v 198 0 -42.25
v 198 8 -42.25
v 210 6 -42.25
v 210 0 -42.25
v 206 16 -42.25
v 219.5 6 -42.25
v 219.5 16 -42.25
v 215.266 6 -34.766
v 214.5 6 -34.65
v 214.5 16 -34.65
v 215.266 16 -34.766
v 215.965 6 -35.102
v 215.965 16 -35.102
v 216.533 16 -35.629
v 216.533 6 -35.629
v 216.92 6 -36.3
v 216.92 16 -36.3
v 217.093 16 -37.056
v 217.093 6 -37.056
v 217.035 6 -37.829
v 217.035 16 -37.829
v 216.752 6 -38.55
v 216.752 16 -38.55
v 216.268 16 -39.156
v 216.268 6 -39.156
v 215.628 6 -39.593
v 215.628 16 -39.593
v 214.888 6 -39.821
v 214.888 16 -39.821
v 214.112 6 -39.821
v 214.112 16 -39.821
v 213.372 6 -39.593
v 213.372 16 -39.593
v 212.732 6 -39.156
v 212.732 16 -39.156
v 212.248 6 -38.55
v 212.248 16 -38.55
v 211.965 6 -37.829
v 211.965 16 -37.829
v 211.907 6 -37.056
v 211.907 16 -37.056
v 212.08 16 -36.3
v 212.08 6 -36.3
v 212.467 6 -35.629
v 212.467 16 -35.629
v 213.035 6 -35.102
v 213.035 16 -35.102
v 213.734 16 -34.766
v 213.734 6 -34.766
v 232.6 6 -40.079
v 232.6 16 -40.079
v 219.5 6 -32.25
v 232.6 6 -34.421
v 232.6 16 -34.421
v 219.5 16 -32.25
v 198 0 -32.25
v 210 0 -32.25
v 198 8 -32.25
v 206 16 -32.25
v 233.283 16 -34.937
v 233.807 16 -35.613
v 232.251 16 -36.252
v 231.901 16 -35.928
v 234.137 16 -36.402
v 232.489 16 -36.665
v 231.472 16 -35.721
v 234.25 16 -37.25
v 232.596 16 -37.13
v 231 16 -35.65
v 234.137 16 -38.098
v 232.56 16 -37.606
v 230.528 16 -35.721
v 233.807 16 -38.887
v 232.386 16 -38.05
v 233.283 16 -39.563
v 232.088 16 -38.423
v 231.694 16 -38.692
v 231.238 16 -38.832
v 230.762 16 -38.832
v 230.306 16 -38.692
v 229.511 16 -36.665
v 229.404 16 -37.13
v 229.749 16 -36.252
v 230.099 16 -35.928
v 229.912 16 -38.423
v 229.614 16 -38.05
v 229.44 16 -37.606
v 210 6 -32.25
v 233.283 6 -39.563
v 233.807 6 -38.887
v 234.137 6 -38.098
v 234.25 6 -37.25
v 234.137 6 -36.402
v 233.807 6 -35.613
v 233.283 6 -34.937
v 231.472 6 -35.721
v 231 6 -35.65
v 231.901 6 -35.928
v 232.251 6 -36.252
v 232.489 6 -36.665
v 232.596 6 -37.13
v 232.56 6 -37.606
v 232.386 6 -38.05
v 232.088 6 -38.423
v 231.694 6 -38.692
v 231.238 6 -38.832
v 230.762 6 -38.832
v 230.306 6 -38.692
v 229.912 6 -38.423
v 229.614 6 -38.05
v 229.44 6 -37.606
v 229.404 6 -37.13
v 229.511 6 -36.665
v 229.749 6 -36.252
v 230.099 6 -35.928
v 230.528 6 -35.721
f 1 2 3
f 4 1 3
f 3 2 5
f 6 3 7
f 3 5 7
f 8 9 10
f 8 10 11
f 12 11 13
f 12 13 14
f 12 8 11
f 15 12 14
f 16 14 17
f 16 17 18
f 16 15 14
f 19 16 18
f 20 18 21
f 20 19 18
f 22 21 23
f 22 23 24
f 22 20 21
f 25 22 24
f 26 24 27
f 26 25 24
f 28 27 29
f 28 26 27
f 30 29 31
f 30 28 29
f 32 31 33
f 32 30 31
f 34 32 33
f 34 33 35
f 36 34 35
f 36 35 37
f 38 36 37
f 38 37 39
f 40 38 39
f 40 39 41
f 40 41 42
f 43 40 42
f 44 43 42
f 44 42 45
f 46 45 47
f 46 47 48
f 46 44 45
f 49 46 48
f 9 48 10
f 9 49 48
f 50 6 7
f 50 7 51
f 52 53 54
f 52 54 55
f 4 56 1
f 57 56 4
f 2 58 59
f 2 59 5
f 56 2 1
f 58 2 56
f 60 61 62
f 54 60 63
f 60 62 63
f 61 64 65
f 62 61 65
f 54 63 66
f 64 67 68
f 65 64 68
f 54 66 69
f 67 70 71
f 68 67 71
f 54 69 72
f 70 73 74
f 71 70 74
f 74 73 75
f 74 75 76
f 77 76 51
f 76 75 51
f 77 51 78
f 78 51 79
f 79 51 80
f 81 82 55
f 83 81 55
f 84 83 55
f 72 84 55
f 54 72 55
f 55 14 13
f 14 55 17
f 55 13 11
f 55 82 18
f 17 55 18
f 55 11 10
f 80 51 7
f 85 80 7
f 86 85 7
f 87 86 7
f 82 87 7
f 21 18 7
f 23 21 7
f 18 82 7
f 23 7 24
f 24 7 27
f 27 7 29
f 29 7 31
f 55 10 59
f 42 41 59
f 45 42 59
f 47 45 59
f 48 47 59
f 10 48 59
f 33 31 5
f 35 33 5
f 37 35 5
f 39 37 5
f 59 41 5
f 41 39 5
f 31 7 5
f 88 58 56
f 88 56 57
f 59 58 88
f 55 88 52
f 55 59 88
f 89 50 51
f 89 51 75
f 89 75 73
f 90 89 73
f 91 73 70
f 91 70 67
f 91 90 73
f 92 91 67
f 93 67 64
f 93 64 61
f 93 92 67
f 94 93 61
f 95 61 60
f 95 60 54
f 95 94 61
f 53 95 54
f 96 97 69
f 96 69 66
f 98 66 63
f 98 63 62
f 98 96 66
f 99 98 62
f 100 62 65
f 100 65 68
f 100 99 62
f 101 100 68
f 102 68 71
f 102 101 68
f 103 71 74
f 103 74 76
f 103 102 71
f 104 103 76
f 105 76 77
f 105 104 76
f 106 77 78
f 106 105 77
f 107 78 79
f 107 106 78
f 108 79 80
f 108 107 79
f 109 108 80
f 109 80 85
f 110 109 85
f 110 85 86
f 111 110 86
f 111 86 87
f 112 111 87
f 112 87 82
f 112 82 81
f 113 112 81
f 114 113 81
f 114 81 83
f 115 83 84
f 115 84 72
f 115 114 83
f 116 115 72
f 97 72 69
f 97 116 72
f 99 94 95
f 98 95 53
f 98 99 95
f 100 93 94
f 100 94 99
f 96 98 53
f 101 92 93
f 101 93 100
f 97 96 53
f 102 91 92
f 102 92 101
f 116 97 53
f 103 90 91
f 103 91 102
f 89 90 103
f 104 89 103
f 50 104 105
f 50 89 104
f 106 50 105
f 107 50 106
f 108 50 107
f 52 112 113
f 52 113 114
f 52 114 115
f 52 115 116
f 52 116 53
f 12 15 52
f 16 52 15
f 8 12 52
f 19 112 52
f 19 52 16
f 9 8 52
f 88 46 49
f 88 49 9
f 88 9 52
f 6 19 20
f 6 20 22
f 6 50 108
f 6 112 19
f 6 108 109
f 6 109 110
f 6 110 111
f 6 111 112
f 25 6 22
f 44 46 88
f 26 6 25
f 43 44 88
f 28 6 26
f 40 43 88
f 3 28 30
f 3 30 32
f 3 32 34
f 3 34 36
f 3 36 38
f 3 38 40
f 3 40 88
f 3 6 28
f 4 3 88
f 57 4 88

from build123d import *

# Parameters (mm, degrees)
SKETCH1_R             = 5.9875
SKETCH1_R_2           = 1.7
SKETCH1_R_3           = 1.6
BOSS_EXTRUDE1_DEPTH   = 6
MOVE_FACE1_BY         = 5
MOVE_FACE1_2_BY       = 5
MOVE_FACE1_3_BY       = 5
MOVE_FACE1_4_BY       = 5
M4X0_7_TAPPED_HOLE2_D = 3.3
POCKET_WALLS_DEPTH    = 2.6
RIB_PATTERN_DEPTH     = 3
MOVE_FACE2_BY         = 4.5
MOVE_FACE2_2_BY       = 4.5
MOVE_FACE2_3_BY       = 4.5
MOVE_FACE2_4_BY       = 4.5
MOVE_FACE2_5_BY       = 4.5
MOVE_FACE2_6_BY       = 4.5
MOVE_FACE2_7_BY       = 4.5
MOVE_FACE2_8_BY       = 4.5
MOVE_FACE2_9_BY       = 4.5
MOVE_FACE2_10_BY      = 4.5
MOVE_FACE2_11_BY      = 4.5
MOVE_FACE2_12_BY      = 4.5
MOVE_FACE2_13_BY      = 4.5
MOVE_FACE2_14_BY      = 4.5
BOSS_EXTRUDE6_REACH   = 382.427
SKETCH19_W            = 1
SKETCH19_H            = 3
BOSS_EXTRUDE7_REACH   = 375.768
SKETCH20_W            = 1
SKETCH20_H            = 3
CUT_EXTRUDE4_DEPTH    = 4.5
POCKET_FILLETS_R      = 2.5
FILLET9_R             = 3
MOVE_FACE3_BY         = 12
MOVE_FACE3_2_BY       = 12
SKETCH23_W            = 12
SKETCH23_H            = 38.175
CUT_EXTRUDE5_DEPTH    = 245.489391385
MOVE_FACE4_BY         = 4
MOVE_FACE4_2_BY       = 4
FILLET6_R             = 5
FILLET7_R             = 11
FILLET8_START         = -1
FILLET8_DEPTH         = 8
FILLET8_2_DEPTH       = 6
SKETCH25_R            = 1.6
SKETCH25_R_2          = 2.6
BOSS_EXTRUDE9_DEPTH   = 10
SKETCH26_W            = 12
SKETCH26_H            = 10
BOSS_EXTRUDE10_DEPTH  = 6
CHAMFER2_SIZE         = 8


with BuildPart() as part:
    # Sketch1 → Boss-Extrude1 (new body)
    with BuildSketch(Plane(origin=(0, 0, 0), x_dir=(1, 0, 0), z_dir=(0, 1, 0))):
        Polygon((-240, 46.25), (-198, 46.25), (-198, 26.5), (198, 26.5), (198, 46.25), (240, 46.25), (240, -18.75), (201, -18.75), (201, 0), (-201, 0), (-201, -18.75), (-240, -18.75), align=None)
        with Locations(Location((-231, 24.425, 0), (0, 0, 270))):
            Circle(SKETCH1_R, mode=Mode.SUBTRACT)
        with Locations(Location((-214.5, 37.25, 0), (0, 0, 270))):
            Circle(SKETCH1_R, mode=Mode.SUBTRACT)
        with Locations(Location((214.5, 37.25, 0), (0, 0, 90))):
            Circle(SKETCH1_R, mode=Mode.SUBTRACT)
        with Locations(Location((231, 24.425, 0), (0, 0, 90))):
            Circle(SKETCH1_R, mode=Mode.SUBTRACT)
        with Locations(Location((-204.5, -6.05, 0), (0, 0, 270))):
            Circle(SKETCH1_R_2, mode=Mode.SUBTRACT)
        with Locations(Location((-224.5, -6.05, 0), (0, 0, 270))):
            Circle(SKETCH1_R_2, mode=Mode.SUBTRACT)
        with Locations(Location((-204.5, 13.95, 0), (0, 0, 270))):
            Circle(SKETCH1_R_2, mode=Mode.SUBTRACT)
        with Locations(Location((-224.5, 13.95, 0), (0, 0, 270))):
            Circle(SKETCH1_R_2, mode=Mode.SUBTRACT)
        with Locations(Location((204.5, -6.05, 0), (0, 0, 90))):
            Circle(SKETCH1_R_2, mode=Mode.SUBTRACT)
        with Locations(Location((204.5, 13.95, 0), (0, 0, 90))):
            Circle(SKETCH1_R_2, mode=Mode.SUBTRACT)
        with Locations(Location((224.5, 13.95, 0), (0, 0, 90))):
            Circle(SKETCH1_R_2, mode=Mode.SUBTRACT)
        with Locations(Location((224.5, -6.05, 0), (0, 0, 90))):
            Circle(SKETCH1_R_2, mode=Mode.SUBTRACT)
        with Locations(Location((-187.5, 13.25, 0), (0, 0, 270))):
            Circle(SKETCH1_R_3, mode=Mode.SUBTRACT)
        with Locations(Location((-162.5, 13.25, 0), (0, 0, 270))):
            Circle(SKETCH1_R_3, mode=Mode.SUBTRACT)
        with Locations(Location((-137.5, 13.25, 0), (0, 0, 270))):
            Circle(SKETCH1_R_3, mode=Mode.SUBTRACT)
        with Locations(Location((-112.5, 13.25, 0), (0, 0, 270))):
            Circle(SKETCH1_R_3, mode=Mode.SUBTRACT)
        with Locations(Location((-87.5, 13.25, 0), (0, 0, 270))):
            Circle(SKETCH1_R_3, mode=Mode.SUBTRACT)
        with Locations(Location((-62.5, 13.25, 0), (0, 0, 270))):
            Circle(SKETCH1_R_3, mode=Mode.SUBTRACT)
        with Locations(Location((-37.5, 13.25, 0), (0, 0, 270))):
            Circle(SKETCH1_R_3, mode=Mode.SUBTRACT)
        with Locations(Location((-12.5, 13.25, 0), (0, 0, 270))):
            Circle(SKETCH1_R_3, mode=Mode.SUBTRACT)
        with Locations(Location((12.5, 13.25, 0), (0, 0, 270))):
            Circle(SKETCH1_R_3, mode=Mode.SUBTRACT)
        with Locations(Location((37.5, 13.25, 0), (0, 0, 270))):
            Circle(SKETCH1_R_3, mode=Mode.SUBTRACT)
        with Locations(Location((62.5, 13.25, 0), (0, 0, 270))):
            Circle(SKETCH1_R_3, mode=Mode.SUBTRACT)
        with Locations(Location((87.5, 13.25, 0), (0, 0, 270))):
            Circle(SKETCH1_R_3, mode=Mode.SUBTRACT)
        with Locations(Location((112.5, 13.25, 0), (0, 0, 270))):
            Circle(SKETCH1_R_3, mode=Mode.SUBTRACT)
        with Locations(Location((137.5, 13.25, 0), (0, 0, 270))):
            Circle(SKETCH1_R_3, mode=Mode.SUBTRACT)
        with Locations(Location((-231, 37.25, 0), (0, 0, 270))):
            Circle(SKETCH1_R_3, mode=Mode.SUBTRACT)
        with Locations(Location((231, 37.25, 0), (0, 0, 90))):
            Circle(SKETCH1_R_3, mode=Mode.SUBTRACT)
        with Locations(Location((162.5, 13.25, 0), (0, 0, 270))):
            Circle(SKETCH1_R_3, mode=Mode.SUBTRACT)
        with Locations(Location((187.5, 13.25, 0), (0, 0, 270))):
            Circle(SKETCH1_R_3, mode=Mode.SUBTRACT)
    extrude(amount=BOSS_EXTRUDE1_DEPTH)

    # Move Face1: a curved face moved outward by 5.0
    add(Solid.thicken(part.faces().sort_by_distance((231, 3, -18.4375))[0], MOVE_FACE1_BY))

    # Move Face1 2: a curved face moved outward by 5.0
    add(Solid.thicken(part.faces().sort_by_distance((214.5, 3, -31.2625))[0], MOVE_FACE1_2_BY))

    # Move Face1 3: a curved face moved outward by 5.0
    add(Solid.thicken(part.faces().sort_by_distance((-214.5, 3, -43.2375))[0], MOVE_FACE1_3_BY))

    # Move Face1 4: a curved face moved outward by 5.0
    add(Solid.thicken(part.faces().sort_by_distance((-231, 3, -30.4125))[0], MOVE_FACE1_4_BY))

    # M4x0.7 Tapped Hole2 (through all)
    with Locations(Plane(origin=(0, 6, 0), x_dir=(1, 0, 0), z_dir=(0, 1, 0))):
        with Locations((-214.5, 37.25), (-231, 24.425), (231, 24.425), (214.5, 37.25)):
            Hole(M4X0_7_TAPPED_HOLE2_D / 2)

    # Sketch13 → Pocket Walls (add)
    with BuildSketch(Plane.XY):
        Polygon((-214, 6), (-208.803847577, 9), (208.803847577, 9), (214, 6), align=None)
    pocket_walls = extrude(amount=-POCKET_WALLS_DEPTH)

    # Mirror1: Pocket Walls across plane
    add(pocket_walls.mirror(Plane.XY.offset(-13.25)))

    # zig_zag_style_1 → Rib Pattern (add)
    with BuildSketch(Plane(origin=(0, 6, 0), x_dir=(1, 0, 0), z_dir=(0, 1, 0))):
        Polygon((-186.851468198, 1.838812439), (-162.5, 22.586263345), (-137.5, 1.286263345), (-112.5, 22.586263345), (-87.5, 1.286263345), (-62.5, 22.586263345), (-37.5, 1.286263345), (-12.5, 22.586263345), (12.5, 1.286263345), (37.5, 22.586263345), (62.5, 1.286263345), (87.5, 22.586263345), (112.5, 1.286263345), (137.5, 22.586263345), (162.5, 1.286263345), (188.148531802, 23.138812439), (186.851468198, 24.661187561), (162.5, 3.913736655), (137.5, 25.213736655), (112.5, 3.913736655), (87.5, 25.213736655), (62.5, 3.913736655), (37.5, 25.213736655), (12.5, 3.913736655), (-12.5, 25.213736655), (-37.5, 3.913736655), (-62.5, 25.213736655), (-87.5, 3.913736655), (-112.5, 25.213736655), (-137.5, 3.913736655), (-162.5, 25.213736655), (-188.148531802, 3.361187561), align=None)
    extrude(amount=RIB_PATTERN_DEPTH)

    # Move Face2: a face moved inward by 4.5
    extrude(part.faces().sort_by_distance((162.5, 6, -17.307514961))[0], amount=MOVE_FACE2_BY, dir=(0, -1, 0), mode=Mode.SUBTRACT)

    # Move Face2 2: a face moved inward by 4.5
    extrude(part.faces().sort_by_distance((137.5, 6, -9.192485039))[0], amount=MOVE_FACE2_2_BY, dir=(0, -1, 0), mode=Mode.SUBTRACT)

    # Move Face2 3: a face moved inward by 4.5
    extrude(part.faces().sort_by_distance((112.5, 6, -17.307514961))[0], amount=MOVE_FACE2_3_BY, dir=(0, -1, 0), mode=Mode.SUBTRACT)

    # Move Face2 4: a face moved inward by 4.5
    extrude(part.faces().sort_by_distance((87.5, 6, -9.192485039))[0], amount=MOVE_FACE2_4_BY, dir=(0, -1, 0), mode=Mode.SUBTRACT)

    # Move Face2 5: a face moved inward by 4.5
    extrude(part.faces().sort_by_distance((62.5, 6, -17.307514961))[0], amount=MOVE_FACE2_5_BY, dir=(0, -1, 0), mode=Mode.SUBTRACT)

    # Move Face2 6: a face moved inward by 4.5
    extrude(part.faces().sort_by_distance((37.5, 6, -9.192485039))[0], amount=MOVE_FACE2_6_BY, dir=(0, -1, 0), mode=Mode.SUBTRACT)

    # Move Face2 7: a face moved inward by 4.5
    extrude(part.faces().sort_by_distance((12.5, 6, -17.307514961))[0], amount=MOVE_FACE2_7_BY, dir=(0, -1, 0), mode=Mode.SUBTRACT)

    # Move Face2 8: a face moved inward by 4.5
    extrude(part.faces().sort_by_distance((-12.5, 6, -9.192485039))[0], amount=MOVE_FACE2_8_BY, dir=(0, -1, 0), mode=Mode.SUBTRACT)

    # Move Face2 9: a face moved inward by 4.5
    extrude(part.faces().sort_by_distance((-37.5, 6, -17.307514961))[0], amount=MOVE_FACE2_9_BY, dir=(0, -1, 0), mode=Mode.SUBTRACT)

    # Move Face2 10: a face moved inward by 4.5
    extrude(part.faces().sort_by_distance((-62.5, 6, -9.192485039))[0], amount=MOVE_FACE2_10_BY, dir=(0, -1, 0), mode=Mode.SUBTRACT)

    # Move Face2 11: a face moved inward by 4.5
    extrude(part.faces().sort_by_distance((-87.5, 6, -17.307514961))[0], amount=MOVE_FACE2_11_BY, dir=(0, -1, 0), mode=Mode.SUBTRACT)

    # Move Face2 12: a face moved inward by 4.5
    extrude(part.faces().sort_by_distance((-112.5, 6, -9.192485039))[0], amount=MOVE_FACE2_12_BY, dir=(0, -1, 0), mode=Mode.SUBTRACT)

    # Move Face2 13: a face moved inward by 4.5
    extrude(part.faces().sort_by_distance((-162.5, 6, -9.192485039))[0], amount=MOVE_FACE2_13_BY, dir=(0, -1, 0), mode=Mode.SUBTRACT)

    # Move Face2 14: a face moved inward by 4.5
    extrude(part.faces().sort_by_distance((-137.5, 6, -17.307514961))[0], amount=MOVE_FACE2_14_BY, dir=(0, -1, 0), mode=Mode.SUBTRACT)

    # Boss-Extrude6: up to this face of the body (flat: up to its plane)
    boss_extrude6_end = Plane(part.part.faces().sort_by_distance((199.498029235, 7.445651316, -23.9))[0])
    # Sketch19 → Boss-Extrude6 (add, up to the picked face)
    with BuildSketch(Plane(origin=(120.437057913, 0, -102.612373342), x_dir=(-0.6485318015860708, 0, -0.7611875605470214), z_dir=(0.7611875605470213, 0, -0.6485318015860707)), mode=Mode.PRIVATE) as boss_extrude6_sk1:
        with Locations((-103.9073301, 7.5)):
            Rectangle(SKETCH19_W, SKETCH19_H)
    boss_extrude6_tool1 = split(extrude(boss_extrude6_sk1.sketch, amount=BOSS_EXTRUDE6_REACH, mode=Mode.PRIVATE), bisect_by=boss_extrude6_end, keep=Keep.BOTH, mode=Mode.PRIVATE)
    add(boss_extrude6_tool1.solids().sort_by(Axis((187.824266, 7.5, -23.519406), (0.7611875605470213, 0, -0.6485318015860707)))[0])

    # Boss-Extrude7: up to this face of the body (flat: up to its plane)
    boss_extrude7_end = Plane(part.part.faces().sort_by_distance((-199.498029235, 7.445651316, -2.6))[0])
    # Sketch20 → Boss-Extrude7 (add, up to the picked face)
    with BuildSketch(Plane(origin=(-107.355217903, 0, 91.466645654), x_dir=(0.6485318015860708, 0, 0.7611875605470213), z_dir=(-0.7611875605470213, 0, 0.6485318015860708)), mode=Mode.PRIVATE) as boss_extrude7_sk1:
        with Locations((-124.078800455, 7.5)):
            Rectangle(SKETCH20_W, SKETCH20_H)
    boss_extrude7_tool1 = split(extrude(boss_extrude7_sk1.sketch, amount=BOSS_EXTRUDE7_REACH, mode=Mode.PRIVATE), bisect_by=boss_extrude7_end, keep=Keep.BOTH, mode=Mode.PRIVATE)
    add(boss_extrude7_tool1.solids().sort_by(Axis((-187.824266, 7.5, -2.980594), (-0.7611875605470213, 0, 0.6485318015860708)))[0])

    # Sketch22 → Cut-Extrude4 (cut)
    with BuildSketch(Plane(origin=(0, 6, 0), x_dir=(1, 0, 0), z_dir=(0, 1, 0))):
        Polygon((-201, 2.6), (-201, 23.9), (-164.041944431, 23.9), (-189.041944431, 2.6), align=None)
        Polygon((201, 2.6), (201, 23.9), (189.041944431, 23.9), (164.041944431, 2.6), align=None)
    extrude(amount=-CUT_EXTRUDE4_DEPTH, mode=Mode.SUBTRACT)

    # Pocket FIllets
    pocket_fillets_edges = [part.edges().sort_by_distance(p)[0] for p in [
        (185.958055569, 5.25, -23.9),
        (139.041944431, 5.25, -23.9),
        (135.958055569, 5.25, -23.9),
        (89.041944431, 5.25, -23.9),
        (85.958055569, 5.25, -23.9),
        (39.041944431, 5.25, -23.9),
        (35.958055569, 5.25, -23.9),
        (-10.958055569, 5.25, -23.9),
        (-14.041944431, 5.25, -23.9),
        (-60.958055569, 5.25, -23.9),
        (-64.041944431, 5.25, -23.9),
        (-110.958055569, 5.25, -23.9),
        (-114.041944431, 5.25, -23.9),
        (-160.958055569, 5.25, -23.9),
        (-164.041944431, 5.25, -23.9),
        (164.041944431, 5.25, -2.6),
        (-185.958055569, 5.25, -2.6),
        (-139.041944431, 5.25, -2.6),
        (-135.958055569, 5.25, -2.6),
        (-89.041944431, 5.25, -2.6),
        (-85.958055569, 5.25, -2.6),
        (-39.041944431, 5.25, -2.6),
        (-35.958055569, 5.25, -2.6),
        (10.958055569, 5.25, -2.6),
        (14.041944431, 5.25, -2.6),
        (60.958055569, 5.25, -2.6),
        (64.041944431, 5.25, -2.6),
        (110.958055569, 5.25, -2.6),
        (114.041944431, 5.25, -2.6),
        (160.958055569, 5.25, -2.6),
        (137.5, 5.25, -22.586263345),
        (87.5, 5.25, -22.586263345),
        (37.5, 5.25, -22.586263345),
        (-12.5, 5.25, -22.586263345),
        (-62.5, 5.25, -22.586263345),
        (-112.5, 5.25, -22.586263345),
        (-162.5, 5.25, -22.586263345),
        (-137.5, 5.25, -3.913736655),
        (-87.5, 5.25, -3.913736655),
        (-37.5, 5.25, -3.913736655),
        (12.5, 5.25, -3.913736655),
        (62.5, 5.25, -3.913736655),
        (112.5, 5.25, -3.913736655),
        (162.5, 5.25, -3.913736655),
        (189.041944431, 5.25, -23.9),
        (-189.041944431, 5.25, -2.6),
    ]]
    fillet(pocket_fillets_edges, radius=POCKET_FILLETS_R)

    # Fillet9
    fillet9_edges = [part.edges().sort_by_distance(p)[0] for p in [
        (-201, 3.75, -2.6),
        (-201, 3.75, -23.9),
        (201, 3.75, -2.6),
        (201, 3.75, -23.9),
    ]]
    fillet(fillet9_edges, radius=FILLET9_R)

    # Move Face3: a face moved inward by 12.0
    extrude(part.faces().sort_by_distance((198, 3, -36.375))[0], amount=MOVE_FACE3_BY, dir=(1, 0, 0), mode=Mode.SUBTRACT)

    # Move Face3 2: a face moved inward by 12.0
    extrude(part.faces().sort_by_distance((-198, 3, -36.375))[0], amount=MOVE_FACE3_2_BY, dir=(-1, 0, 0), mode=Mode.SUBTRACT)

    # Sketch23 → Cut-Extrude5 (cut, through all)
    with BuildSketch(Plane(origin=(0, 6, 0), x_dir=(1, 0, 0), z_dir=(0, 1, 0))):
        with Locations((-234, 0.3375)):
            Rectangle(SKETCH23_W, SKETCH23_H)
        with Locations((234, 0.3375)):
            Rectangle(SKETCH23_W, SKETCH23_H)
    extrude(amount=-CUT_EXTRUDE5_DEPTH, mode=Mode.SUBTRACT)

    # Move Face4: a face moved inward by 4.0
    extrude(part.faces().sort_by_distance((-240, 3, -32.8375))[0], amount=MOVE_FACE4_BY, dir=(1, 0, 0), mode=Mode.SUBTRACT)

    # Move Face4 2: a face moved inward by 4.0
    extrude(part.faces().sort_by_distance((240, 3, -32.8375))[0], amount=MOVE_FACE4_2_BY, dir=(-1, 0, 0), mode=Mode.SUBTRACT)

    # Fillet6
    fillet6_edges = [part.edges().sort_by_distance(p)[0] for p in [
        (-210, 3, -46.25),
        (-210, 3, -26.5),
        (210, 3, -26.5),
        (210, 3, -46.25),
        (201, 3, 18.75),
        (201, 3, 0),
        (-201, 3, 0),
        (-201, 3, 18.75),
        (-228, 3, 18.75),
        (228, 3, 18.75),
    ]]
    fillet(fillet6_edges, radius=FILLET6_R)

    # Fillet7
    fillet7_edges = [part.edges().sort_by_distance(p)[0] for p in [
        (-236, 3, -46.25),
        (236, 3, -46.25),
    ]]
    fillet(fillet7_edges, radius=FILLET7_R)

    # Fillet8: read off the stored shape, not the designer's step
    # Fillet8 outline → Fillet8 (cut)
    with BuildSketch(Plane(origin=(0, 0, 0), x_dir=(1, 0, 0), z_dir=(0, 1, 0)).offset(FILLET8_START)):
        with BuildLine():
            Line((-236, 19.425), (-232, 19.425))
            ThreePointArc((-232, 19.425), (-234.828427125, 20.596572875), (-236, 23.425))
            Line((-236, 23.425), (-236, 19.425))
        make_face()
        with BuildLine():
            ThreePointArc((236, 23.425), (234.828427125, 20.596572875), (232, 19.425))
            Line((232, 19.425), (236, 19.425))
            Line((236, 19.425), (236, 23.425))
        make_face()
    extrude(amount=FILLET8_DEPTH, mode=Mode.SUBTRACT)

    # Fillet8 2 outline → Fillet8 2 (add)
    with BuildSketch(Plane(origin=(0, 0, 0), x_dir=(1, 0, 0), z_dir=(0, 1, 0))):
        with BuildLine():
            Line((-228, 19.425), (-232, 19.425))
            ThreePointArc((-232, 19.425), (-229.171572875, 18.253427125), (-228, 15.425))
            Line((-228, 15.425), (-228, 19.425))
        make_face()
        with BuildLine():
            Line((228, 19.425), (228, 15.425))
            ThreePointArc((228, 15.425), (229.171572875, 18.253427125), (232, 19.425))
            Line((232, 19.425), (228, 19.425))
        make_face()
    extrude(amount=FILLET8_2_DEPTH)


with BuildPart() as body_2:
    # Sketch25 → Boss-Extrude9 (new body)
    with BuildSketch(Plane(origin=(0, 6, 0), x_dir=(1, 0, 0), z_dir=(0, 1, 0))):
        with BuildLine():
            Line((198, 32.25), (198, 42.25))
            Line((198, 42.25), (219.5, 42.25))
            Line((219.5, 42.25), (232.6, 40.078869032))
            ThreePointArc((232.6, 40.078869032), (234.25, 37.25), (232.6, 34.421130968))
            Line((232.6, 34.421130968), (219.5, 32.25))
            Line((219.5, 32.25), (198, 32.25))
        make_face()
        with Locations(Location((231, 37.25, 0), (0, 0, 270))):
            Circle(SKETCH25_R, mode=Mode.SUBTRACT)
        with Locations(Location((214.5, 37.25, 0), (0, 0, 270))):
            Circle(SKETCH25_R_2, mode=Mode.SUBTRACT)
    extrude(amount=BOSS_EXTRUDE9_DEPTH)

    # Sketch26 → Boss-Extrude10 (add)
    with BuildSketch(Plane.XZ.offset(-6)):
        with Locations((204, -37.25)):
            Rectangle(SKETCH26_W, SKETCH26_H)
    extrude(amount=BOSS_EXTRUDE10_DEPTH)

    # Chamfer2
    chamfer2_edges = [body_2.edges().sort_by_distance(p)[0] for p in [
        (198, 16, -37.25),
    ]]
    chamfer(chamfer2_edges, length=CHAMFER2_SIZE)


solid = body_2.part
